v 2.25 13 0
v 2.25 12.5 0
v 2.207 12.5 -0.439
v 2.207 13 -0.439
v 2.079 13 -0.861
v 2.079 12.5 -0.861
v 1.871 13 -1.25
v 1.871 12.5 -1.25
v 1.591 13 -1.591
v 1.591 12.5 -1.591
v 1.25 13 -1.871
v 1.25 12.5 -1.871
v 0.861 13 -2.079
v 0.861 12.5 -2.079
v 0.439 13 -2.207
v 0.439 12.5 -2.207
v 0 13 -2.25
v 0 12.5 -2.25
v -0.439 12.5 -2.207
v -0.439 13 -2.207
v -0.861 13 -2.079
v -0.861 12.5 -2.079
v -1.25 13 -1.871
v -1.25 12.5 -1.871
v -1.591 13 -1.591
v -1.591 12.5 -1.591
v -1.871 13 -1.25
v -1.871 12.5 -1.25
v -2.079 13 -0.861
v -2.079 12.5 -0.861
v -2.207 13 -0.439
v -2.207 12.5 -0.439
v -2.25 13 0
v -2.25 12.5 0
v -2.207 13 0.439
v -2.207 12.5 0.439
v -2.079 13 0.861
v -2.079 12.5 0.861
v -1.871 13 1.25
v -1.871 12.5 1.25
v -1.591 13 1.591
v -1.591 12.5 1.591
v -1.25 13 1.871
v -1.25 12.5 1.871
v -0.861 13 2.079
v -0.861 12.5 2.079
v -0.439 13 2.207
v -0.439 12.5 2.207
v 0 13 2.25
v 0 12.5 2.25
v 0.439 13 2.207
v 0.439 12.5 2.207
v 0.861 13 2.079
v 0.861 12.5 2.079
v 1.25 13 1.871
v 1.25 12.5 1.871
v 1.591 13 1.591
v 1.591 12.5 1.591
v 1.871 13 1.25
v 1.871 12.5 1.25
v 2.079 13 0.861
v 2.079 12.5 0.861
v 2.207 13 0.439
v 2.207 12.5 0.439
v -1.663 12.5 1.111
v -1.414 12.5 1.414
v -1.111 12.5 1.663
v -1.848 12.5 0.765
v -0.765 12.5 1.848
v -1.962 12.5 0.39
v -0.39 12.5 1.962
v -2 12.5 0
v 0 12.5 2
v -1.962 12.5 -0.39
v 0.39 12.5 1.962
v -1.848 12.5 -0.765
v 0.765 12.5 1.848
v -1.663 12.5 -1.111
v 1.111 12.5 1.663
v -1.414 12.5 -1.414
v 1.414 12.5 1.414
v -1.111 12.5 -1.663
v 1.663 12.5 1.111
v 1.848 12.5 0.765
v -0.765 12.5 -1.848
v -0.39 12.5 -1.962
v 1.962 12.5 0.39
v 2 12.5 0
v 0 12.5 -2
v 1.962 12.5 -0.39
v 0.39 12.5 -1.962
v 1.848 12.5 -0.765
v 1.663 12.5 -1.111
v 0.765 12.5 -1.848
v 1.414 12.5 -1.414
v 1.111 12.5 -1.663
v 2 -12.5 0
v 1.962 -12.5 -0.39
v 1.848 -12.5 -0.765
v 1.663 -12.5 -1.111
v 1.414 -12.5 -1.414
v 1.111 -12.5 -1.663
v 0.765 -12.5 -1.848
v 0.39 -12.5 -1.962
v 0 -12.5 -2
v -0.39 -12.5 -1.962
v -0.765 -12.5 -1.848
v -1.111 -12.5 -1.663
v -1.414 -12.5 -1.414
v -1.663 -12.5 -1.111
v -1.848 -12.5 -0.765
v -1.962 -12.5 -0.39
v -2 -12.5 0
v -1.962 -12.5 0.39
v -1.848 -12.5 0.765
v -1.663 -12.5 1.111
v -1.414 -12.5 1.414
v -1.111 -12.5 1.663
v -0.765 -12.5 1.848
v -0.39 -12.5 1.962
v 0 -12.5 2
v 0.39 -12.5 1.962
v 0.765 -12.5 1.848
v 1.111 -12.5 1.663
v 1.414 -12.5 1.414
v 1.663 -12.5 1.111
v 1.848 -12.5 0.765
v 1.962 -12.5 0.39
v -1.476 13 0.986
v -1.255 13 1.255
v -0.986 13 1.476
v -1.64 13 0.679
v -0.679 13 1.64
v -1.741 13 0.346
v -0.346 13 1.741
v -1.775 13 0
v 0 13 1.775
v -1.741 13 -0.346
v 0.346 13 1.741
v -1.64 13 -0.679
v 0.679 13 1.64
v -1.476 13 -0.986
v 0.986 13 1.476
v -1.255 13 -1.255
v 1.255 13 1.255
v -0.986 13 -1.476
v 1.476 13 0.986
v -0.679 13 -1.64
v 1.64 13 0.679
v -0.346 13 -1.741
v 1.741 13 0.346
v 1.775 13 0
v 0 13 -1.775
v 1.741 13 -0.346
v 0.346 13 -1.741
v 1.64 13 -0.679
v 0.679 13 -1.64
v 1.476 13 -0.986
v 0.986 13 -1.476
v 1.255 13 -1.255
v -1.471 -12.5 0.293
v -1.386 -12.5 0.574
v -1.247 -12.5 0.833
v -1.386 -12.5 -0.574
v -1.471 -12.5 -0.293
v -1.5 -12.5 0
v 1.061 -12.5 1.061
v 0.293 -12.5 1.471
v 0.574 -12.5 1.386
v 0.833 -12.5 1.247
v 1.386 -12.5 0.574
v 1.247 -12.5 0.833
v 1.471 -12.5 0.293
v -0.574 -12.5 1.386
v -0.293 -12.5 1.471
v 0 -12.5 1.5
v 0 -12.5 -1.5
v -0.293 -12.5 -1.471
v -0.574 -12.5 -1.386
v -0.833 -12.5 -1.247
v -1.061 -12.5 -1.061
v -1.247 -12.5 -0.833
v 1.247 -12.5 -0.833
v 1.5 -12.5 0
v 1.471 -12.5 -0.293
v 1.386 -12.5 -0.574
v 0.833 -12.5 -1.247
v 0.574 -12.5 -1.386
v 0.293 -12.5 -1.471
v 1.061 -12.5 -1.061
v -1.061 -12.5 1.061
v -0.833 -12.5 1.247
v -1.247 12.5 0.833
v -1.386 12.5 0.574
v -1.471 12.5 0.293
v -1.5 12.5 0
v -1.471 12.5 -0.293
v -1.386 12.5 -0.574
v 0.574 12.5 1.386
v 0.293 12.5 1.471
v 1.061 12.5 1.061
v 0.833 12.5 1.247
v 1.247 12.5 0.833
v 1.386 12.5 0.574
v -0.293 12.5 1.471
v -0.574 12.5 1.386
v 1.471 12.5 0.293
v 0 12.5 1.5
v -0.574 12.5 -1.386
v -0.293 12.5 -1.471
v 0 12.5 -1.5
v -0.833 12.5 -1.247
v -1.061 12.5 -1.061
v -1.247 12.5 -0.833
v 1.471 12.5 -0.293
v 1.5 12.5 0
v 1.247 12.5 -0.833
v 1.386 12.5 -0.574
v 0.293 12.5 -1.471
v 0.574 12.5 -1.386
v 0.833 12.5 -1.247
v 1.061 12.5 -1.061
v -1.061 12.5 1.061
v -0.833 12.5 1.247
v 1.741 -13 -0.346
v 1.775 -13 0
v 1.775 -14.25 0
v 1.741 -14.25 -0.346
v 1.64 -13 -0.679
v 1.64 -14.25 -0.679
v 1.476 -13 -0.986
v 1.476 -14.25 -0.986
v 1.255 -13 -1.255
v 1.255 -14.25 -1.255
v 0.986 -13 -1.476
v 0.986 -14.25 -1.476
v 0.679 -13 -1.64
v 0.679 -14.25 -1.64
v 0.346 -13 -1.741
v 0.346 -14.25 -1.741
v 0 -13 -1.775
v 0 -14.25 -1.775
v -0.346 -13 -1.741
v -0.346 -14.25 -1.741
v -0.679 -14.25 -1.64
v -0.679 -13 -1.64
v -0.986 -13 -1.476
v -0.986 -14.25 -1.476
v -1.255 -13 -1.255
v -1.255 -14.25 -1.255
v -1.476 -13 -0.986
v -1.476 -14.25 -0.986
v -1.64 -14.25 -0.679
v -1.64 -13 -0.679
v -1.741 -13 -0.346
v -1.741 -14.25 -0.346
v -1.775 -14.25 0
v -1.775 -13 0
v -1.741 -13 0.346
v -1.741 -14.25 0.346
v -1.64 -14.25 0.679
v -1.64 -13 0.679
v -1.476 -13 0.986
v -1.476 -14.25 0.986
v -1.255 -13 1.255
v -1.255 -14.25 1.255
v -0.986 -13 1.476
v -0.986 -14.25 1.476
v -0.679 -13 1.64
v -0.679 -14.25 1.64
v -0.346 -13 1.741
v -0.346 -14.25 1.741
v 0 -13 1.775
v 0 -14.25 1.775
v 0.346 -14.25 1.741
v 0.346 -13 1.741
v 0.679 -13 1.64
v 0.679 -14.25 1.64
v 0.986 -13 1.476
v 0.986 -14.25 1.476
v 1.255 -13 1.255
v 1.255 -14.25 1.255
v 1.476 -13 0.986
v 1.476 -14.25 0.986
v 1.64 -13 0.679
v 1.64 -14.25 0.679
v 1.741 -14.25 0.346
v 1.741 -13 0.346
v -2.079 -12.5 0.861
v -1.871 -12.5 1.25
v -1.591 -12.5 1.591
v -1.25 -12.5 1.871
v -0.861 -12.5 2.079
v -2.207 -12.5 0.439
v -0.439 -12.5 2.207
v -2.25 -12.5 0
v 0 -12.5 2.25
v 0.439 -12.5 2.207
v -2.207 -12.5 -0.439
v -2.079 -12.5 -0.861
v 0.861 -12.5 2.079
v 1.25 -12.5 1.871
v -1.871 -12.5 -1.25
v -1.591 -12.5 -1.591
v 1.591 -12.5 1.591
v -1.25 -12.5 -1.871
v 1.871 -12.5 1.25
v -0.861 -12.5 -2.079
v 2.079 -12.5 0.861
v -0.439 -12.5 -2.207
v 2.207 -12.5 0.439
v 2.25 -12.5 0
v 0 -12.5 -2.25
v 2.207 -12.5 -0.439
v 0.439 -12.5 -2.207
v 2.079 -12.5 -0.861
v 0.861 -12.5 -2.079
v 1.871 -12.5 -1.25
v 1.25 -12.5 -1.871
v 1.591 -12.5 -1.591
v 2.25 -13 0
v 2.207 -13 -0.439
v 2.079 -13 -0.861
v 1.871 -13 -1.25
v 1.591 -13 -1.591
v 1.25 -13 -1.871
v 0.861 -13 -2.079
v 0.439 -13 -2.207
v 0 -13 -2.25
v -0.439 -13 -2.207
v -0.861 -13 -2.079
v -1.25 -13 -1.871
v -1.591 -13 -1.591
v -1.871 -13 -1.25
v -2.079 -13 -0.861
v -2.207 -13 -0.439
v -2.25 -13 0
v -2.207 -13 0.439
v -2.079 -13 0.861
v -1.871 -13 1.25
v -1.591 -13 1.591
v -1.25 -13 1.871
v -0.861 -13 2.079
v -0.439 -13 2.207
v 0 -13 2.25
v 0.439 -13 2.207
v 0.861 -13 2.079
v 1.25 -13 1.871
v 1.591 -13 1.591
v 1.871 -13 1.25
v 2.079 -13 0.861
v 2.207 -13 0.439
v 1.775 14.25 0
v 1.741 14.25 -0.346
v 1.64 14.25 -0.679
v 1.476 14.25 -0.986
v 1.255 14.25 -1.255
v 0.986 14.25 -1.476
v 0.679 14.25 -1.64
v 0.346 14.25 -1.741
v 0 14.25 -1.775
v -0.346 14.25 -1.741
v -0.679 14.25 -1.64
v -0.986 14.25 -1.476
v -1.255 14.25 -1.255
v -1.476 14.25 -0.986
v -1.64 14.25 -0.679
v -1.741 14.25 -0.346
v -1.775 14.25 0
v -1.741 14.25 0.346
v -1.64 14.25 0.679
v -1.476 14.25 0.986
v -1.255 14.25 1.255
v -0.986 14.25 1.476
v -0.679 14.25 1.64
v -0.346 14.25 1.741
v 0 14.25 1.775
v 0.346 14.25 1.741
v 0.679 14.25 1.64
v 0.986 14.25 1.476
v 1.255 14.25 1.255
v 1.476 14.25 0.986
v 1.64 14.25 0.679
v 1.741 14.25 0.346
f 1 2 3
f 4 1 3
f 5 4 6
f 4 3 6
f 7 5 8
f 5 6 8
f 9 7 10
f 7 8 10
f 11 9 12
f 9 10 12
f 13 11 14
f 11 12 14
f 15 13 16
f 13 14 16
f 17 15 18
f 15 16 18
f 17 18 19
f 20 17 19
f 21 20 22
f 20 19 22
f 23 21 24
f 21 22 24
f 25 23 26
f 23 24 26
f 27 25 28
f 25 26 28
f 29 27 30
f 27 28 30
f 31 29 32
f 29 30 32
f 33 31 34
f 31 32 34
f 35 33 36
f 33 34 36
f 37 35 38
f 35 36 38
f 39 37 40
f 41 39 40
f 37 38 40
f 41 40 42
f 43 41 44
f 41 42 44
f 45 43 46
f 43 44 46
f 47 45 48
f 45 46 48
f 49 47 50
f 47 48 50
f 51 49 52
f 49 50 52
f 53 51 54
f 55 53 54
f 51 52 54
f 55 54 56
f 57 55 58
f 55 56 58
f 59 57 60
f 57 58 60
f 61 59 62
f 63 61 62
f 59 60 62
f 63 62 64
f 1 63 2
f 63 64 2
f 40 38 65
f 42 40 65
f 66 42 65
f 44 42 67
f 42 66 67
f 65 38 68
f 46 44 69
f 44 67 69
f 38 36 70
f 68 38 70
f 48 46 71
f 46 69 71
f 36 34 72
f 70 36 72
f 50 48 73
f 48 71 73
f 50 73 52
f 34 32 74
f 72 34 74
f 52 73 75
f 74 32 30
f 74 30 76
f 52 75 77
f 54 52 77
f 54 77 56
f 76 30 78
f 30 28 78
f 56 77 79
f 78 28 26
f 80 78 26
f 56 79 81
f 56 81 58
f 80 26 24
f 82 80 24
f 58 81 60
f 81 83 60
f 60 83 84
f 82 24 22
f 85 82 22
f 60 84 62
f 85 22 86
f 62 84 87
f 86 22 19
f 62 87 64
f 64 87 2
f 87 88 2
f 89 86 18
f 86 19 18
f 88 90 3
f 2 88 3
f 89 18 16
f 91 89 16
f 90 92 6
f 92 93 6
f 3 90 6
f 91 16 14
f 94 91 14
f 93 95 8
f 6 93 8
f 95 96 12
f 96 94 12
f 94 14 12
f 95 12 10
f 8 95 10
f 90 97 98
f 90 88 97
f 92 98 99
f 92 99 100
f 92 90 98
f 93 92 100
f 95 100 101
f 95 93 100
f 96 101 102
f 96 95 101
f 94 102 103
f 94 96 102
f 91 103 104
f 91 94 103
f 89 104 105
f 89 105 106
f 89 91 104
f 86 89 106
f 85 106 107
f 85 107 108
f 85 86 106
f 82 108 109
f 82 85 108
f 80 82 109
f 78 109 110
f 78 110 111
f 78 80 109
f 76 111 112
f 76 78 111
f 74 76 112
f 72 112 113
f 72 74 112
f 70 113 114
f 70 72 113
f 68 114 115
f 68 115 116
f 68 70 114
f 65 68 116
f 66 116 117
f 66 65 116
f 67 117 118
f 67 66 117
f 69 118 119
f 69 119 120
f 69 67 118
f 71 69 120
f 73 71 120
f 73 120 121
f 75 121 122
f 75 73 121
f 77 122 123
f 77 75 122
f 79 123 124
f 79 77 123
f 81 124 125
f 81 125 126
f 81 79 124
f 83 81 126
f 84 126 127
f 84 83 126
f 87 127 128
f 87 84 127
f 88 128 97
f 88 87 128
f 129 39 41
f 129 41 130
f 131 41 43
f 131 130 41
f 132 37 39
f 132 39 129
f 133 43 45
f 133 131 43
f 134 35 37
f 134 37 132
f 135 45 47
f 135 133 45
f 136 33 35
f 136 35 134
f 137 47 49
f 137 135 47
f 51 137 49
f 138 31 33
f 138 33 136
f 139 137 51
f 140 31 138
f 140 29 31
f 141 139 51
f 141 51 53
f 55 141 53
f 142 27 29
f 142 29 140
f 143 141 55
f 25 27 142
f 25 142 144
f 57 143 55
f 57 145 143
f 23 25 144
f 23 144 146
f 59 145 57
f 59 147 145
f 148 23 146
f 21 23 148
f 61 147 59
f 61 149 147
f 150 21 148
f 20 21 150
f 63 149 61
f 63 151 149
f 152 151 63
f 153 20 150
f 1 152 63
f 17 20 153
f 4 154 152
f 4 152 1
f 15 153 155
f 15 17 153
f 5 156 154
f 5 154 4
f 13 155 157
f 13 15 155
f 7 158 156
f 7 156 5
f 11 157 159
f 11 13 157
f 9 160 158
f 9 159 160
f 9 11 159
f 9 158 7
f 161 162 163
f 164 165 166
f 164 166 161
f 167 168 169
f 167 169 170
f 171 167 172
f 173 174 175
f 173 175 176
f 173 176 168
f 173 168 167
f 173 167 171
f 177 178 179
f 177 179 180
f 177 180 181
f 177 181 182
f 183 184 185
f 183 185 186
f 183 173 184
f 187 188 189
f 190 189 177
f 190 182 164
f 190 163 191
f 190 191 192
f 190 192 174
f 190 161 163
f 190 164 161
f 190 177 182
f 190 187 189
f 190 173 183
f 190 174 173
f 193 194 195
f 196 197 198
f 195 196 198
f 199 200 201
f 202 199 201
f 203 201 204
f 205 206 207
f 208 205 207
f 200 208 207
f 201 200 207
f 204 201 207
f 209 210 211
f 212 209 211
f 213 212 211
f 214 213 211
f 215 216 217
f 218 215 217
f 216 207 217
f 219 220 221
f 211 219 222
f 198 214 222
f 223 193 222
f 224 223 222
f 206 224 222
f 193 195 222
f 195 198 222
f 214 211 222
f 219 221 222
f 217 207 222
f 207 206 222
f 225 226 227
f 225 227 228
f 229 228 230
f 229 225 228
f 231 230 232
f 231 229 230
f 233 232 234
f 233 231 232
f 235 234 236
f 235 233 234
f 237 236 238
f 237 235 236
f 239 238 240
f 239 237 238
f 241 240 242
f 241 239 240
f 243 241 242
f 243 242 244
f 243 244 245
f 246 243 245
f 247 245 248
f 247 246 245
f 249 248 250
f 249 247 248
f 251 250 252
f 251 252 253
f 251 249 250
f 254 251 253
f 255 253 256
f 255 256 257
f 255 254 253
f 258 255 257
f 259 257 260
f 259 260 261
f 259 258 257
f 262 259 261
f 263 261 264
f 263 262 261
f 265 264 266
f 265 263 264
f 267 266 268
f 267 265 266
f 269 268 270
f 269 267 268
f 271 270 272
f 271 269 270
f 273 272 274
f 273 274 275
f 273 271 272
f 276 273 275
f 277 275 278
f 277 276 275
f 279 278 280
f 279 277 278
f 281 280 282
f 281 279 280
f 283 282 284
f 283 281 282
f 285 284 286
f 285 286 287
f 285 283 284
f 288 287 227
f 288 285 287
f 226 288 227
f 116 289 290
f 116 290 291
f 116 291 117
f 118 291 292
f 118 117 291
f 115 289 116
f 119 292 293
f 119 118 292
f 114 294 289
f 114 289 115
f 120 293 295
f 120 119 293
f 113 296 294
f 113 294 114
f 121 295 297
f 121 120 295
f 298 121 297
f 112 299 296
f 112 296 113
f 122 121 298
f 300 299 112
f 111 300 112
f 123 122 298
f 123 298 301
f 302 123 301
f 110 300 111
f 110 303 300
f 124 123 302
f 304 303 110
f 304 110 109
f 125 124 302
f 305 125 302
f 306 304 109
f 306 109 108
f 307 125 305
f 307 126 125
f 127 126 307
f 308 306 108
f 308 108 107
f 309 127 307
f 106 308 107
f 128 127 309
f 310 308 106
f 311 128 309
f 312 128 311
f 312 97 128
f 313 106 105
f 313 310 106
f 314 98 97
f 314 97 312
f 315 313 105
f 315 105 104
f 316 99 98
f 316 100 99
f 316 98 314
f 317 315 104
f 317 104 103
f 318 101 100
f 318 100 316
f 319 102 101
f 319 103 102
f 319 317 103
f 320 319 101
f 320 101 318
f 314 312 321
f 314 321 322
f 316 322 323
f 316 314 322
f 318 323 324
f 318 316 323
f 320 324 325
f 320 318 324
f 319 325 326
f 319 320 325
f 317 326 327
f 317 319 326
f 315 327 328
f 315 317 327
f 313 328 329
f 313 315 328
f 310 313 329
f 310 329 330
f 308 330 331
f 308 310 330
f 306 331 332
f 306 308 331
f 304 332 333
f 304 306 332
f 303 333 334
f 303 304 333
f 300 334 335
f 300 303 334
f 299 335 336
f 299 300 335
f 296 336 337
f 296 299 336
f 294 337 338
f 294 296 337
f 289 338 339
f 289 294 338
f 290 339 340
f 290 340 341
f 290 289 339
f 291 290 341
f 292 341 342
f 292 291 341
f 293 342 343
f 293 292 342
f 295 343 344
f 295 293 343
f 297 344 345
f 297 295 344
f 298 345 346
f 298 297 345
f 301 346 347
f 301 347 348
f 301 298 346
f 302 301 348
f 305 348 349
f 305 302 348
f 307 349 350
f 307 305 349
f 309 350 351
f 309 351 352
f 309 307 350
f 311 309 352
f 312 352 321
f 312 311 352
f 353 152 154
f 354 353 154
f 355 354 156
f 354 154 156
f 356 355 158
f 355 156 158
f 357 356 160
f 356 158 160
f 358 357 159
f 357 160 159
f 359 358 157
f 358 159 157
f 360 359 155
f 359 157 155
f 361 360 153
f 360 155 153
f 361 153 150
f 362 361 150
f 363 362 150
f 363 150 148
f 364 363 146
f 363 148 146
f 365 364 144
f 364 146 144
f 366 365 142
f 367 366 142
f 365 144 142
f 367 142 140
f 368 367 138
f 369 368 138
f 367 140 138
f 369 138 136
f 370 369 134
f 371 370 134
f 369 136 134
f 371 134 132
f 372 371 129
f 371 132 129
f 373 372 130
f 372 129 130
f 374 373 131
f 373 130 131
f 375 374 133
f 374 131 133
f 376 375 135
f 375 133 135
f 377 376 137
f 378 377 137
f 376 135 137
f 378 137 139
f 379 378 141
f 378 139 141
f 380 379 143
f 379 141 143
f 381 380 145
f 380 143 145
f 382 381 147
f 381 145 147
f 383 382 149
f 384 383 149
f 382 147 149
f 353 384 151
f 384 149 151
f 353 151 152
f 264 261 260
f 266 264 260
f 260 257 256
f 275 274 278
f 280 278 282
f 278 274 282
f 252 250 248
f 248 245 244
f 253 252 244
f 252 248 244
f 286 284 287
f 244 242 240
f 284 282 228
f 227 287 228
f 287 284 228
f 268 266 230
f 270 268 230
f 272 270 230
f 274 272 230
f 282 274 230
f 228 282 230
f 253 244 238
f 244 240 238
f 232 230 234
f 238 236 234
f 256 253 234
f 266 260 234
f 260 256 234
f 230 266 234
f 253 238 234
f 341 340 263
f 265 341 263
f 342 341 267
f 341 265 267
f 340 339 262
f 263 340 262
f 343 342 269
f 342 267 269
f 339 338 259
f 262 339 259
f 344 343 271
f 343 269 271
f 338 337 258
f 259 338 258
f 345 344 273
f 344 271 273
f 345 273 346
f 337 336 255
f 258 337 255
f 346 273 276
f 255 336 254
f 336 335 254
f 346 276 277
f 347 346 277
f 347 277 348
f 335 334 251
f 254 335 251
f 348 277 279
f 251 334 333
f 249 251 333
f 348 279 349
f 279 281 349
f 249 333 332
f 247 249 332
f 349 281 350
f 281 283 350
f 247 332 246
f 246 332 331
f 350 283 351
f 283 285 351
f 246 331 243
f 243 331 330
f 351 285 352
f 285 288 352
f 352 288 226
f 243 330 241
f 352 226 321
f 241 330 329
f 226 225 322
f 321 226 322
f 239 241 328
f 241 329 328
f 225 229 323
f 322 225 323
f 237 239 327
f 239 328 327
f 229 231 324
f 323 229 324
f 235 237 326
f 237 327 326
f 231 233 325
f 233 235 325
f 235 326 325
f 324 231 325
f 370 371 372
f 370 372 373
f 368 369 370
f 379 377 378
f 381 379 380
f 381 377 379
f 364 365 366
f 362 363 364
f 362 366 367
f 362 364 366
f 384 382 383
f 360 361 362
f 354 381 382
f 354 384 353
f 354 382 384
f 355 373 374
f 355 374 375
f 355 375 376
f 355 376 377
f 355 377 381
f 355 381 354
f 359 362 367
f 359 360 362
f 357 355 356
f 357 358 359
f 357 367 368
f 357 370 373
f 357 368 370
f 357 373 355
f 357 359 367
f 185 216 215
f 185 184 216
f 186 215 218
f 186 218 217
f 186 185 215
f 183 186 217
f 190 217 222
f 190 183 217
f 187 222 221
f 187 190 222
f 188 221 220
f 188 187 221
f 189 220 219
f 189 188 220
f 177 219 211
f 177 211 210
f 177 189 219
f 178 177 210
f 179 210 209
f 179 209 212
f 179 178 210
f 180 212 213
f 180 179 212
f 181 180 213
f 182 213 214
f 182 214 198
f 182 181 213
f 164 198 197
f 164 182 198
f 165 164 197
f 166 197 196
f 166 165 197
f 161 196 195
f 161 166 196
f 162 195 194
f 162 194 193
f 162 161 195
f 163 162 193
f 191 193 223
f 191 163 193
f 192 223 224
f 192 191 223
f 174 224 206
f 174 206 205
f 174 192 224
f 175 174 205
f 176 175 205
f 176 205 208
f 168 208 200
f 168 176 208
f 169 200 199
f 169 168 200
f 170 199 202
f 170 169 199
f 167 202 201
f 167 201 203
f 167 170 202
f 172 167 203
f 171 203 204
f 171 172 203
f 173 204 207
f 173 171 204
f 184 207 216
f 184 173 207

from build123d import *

# Parameters (mm, degrees)
SKETCH_1_R      = 2
SKETCH_1_R_2    = 1.5
EXTRUDE_1_DEPTH = 12.5
SKETCH_2_R      = 2.25
EXTRUDE_2_DEPTH = 0.5
SKETCH_3_R      = 1.775
EXTRUDE_3_DEPTH = 1.25


with BuildPart() as part:
    # 스케치1 → 보스-돌출1 (new body, symmetric)
    with BuildSketch(Plane(origin=(0, 0, 0), x_dir=(1, 0, 0), z_dir=(0, 1, 0))):
        Circle(SKETCH_1_R)
        Circle(SKETCH_1_R_2, mode=Mode.SUBTRACT)
    extrude(amount=EXTRUDE_1_DEPTH, both=True)

    # 스케치2 → 보스-돌출2 (add)
    with BuildSketch(Plane(origin=(0, 12.5, 0), x_dir=(1, 0, 0), z_dir=(0, 1, 0))):
        Circle(SKETCH_2_R)
    extrude_2 = extrude(amount=EXTRUDE_2_DEPTH)

    # 스케치3 → 보스-돌출3 (add)
    with BuildSketch(Plane(origin=(0, 13, 0), x_dir=(1, 0, 0), z_dir=(0, 1, 0))):
        Circle(SKETCH_3_R)
    extrude_3 = extrude(amount=EXTRUDE_3_DEPTH)

    # 대칭 복사1: 보스-돌출2, 보스-돌출3 across plane
    add(extrude_2.mirror(Plane.ZX))
    add(extrude_3.mirror(Plane.ZX))


solid = part.part
